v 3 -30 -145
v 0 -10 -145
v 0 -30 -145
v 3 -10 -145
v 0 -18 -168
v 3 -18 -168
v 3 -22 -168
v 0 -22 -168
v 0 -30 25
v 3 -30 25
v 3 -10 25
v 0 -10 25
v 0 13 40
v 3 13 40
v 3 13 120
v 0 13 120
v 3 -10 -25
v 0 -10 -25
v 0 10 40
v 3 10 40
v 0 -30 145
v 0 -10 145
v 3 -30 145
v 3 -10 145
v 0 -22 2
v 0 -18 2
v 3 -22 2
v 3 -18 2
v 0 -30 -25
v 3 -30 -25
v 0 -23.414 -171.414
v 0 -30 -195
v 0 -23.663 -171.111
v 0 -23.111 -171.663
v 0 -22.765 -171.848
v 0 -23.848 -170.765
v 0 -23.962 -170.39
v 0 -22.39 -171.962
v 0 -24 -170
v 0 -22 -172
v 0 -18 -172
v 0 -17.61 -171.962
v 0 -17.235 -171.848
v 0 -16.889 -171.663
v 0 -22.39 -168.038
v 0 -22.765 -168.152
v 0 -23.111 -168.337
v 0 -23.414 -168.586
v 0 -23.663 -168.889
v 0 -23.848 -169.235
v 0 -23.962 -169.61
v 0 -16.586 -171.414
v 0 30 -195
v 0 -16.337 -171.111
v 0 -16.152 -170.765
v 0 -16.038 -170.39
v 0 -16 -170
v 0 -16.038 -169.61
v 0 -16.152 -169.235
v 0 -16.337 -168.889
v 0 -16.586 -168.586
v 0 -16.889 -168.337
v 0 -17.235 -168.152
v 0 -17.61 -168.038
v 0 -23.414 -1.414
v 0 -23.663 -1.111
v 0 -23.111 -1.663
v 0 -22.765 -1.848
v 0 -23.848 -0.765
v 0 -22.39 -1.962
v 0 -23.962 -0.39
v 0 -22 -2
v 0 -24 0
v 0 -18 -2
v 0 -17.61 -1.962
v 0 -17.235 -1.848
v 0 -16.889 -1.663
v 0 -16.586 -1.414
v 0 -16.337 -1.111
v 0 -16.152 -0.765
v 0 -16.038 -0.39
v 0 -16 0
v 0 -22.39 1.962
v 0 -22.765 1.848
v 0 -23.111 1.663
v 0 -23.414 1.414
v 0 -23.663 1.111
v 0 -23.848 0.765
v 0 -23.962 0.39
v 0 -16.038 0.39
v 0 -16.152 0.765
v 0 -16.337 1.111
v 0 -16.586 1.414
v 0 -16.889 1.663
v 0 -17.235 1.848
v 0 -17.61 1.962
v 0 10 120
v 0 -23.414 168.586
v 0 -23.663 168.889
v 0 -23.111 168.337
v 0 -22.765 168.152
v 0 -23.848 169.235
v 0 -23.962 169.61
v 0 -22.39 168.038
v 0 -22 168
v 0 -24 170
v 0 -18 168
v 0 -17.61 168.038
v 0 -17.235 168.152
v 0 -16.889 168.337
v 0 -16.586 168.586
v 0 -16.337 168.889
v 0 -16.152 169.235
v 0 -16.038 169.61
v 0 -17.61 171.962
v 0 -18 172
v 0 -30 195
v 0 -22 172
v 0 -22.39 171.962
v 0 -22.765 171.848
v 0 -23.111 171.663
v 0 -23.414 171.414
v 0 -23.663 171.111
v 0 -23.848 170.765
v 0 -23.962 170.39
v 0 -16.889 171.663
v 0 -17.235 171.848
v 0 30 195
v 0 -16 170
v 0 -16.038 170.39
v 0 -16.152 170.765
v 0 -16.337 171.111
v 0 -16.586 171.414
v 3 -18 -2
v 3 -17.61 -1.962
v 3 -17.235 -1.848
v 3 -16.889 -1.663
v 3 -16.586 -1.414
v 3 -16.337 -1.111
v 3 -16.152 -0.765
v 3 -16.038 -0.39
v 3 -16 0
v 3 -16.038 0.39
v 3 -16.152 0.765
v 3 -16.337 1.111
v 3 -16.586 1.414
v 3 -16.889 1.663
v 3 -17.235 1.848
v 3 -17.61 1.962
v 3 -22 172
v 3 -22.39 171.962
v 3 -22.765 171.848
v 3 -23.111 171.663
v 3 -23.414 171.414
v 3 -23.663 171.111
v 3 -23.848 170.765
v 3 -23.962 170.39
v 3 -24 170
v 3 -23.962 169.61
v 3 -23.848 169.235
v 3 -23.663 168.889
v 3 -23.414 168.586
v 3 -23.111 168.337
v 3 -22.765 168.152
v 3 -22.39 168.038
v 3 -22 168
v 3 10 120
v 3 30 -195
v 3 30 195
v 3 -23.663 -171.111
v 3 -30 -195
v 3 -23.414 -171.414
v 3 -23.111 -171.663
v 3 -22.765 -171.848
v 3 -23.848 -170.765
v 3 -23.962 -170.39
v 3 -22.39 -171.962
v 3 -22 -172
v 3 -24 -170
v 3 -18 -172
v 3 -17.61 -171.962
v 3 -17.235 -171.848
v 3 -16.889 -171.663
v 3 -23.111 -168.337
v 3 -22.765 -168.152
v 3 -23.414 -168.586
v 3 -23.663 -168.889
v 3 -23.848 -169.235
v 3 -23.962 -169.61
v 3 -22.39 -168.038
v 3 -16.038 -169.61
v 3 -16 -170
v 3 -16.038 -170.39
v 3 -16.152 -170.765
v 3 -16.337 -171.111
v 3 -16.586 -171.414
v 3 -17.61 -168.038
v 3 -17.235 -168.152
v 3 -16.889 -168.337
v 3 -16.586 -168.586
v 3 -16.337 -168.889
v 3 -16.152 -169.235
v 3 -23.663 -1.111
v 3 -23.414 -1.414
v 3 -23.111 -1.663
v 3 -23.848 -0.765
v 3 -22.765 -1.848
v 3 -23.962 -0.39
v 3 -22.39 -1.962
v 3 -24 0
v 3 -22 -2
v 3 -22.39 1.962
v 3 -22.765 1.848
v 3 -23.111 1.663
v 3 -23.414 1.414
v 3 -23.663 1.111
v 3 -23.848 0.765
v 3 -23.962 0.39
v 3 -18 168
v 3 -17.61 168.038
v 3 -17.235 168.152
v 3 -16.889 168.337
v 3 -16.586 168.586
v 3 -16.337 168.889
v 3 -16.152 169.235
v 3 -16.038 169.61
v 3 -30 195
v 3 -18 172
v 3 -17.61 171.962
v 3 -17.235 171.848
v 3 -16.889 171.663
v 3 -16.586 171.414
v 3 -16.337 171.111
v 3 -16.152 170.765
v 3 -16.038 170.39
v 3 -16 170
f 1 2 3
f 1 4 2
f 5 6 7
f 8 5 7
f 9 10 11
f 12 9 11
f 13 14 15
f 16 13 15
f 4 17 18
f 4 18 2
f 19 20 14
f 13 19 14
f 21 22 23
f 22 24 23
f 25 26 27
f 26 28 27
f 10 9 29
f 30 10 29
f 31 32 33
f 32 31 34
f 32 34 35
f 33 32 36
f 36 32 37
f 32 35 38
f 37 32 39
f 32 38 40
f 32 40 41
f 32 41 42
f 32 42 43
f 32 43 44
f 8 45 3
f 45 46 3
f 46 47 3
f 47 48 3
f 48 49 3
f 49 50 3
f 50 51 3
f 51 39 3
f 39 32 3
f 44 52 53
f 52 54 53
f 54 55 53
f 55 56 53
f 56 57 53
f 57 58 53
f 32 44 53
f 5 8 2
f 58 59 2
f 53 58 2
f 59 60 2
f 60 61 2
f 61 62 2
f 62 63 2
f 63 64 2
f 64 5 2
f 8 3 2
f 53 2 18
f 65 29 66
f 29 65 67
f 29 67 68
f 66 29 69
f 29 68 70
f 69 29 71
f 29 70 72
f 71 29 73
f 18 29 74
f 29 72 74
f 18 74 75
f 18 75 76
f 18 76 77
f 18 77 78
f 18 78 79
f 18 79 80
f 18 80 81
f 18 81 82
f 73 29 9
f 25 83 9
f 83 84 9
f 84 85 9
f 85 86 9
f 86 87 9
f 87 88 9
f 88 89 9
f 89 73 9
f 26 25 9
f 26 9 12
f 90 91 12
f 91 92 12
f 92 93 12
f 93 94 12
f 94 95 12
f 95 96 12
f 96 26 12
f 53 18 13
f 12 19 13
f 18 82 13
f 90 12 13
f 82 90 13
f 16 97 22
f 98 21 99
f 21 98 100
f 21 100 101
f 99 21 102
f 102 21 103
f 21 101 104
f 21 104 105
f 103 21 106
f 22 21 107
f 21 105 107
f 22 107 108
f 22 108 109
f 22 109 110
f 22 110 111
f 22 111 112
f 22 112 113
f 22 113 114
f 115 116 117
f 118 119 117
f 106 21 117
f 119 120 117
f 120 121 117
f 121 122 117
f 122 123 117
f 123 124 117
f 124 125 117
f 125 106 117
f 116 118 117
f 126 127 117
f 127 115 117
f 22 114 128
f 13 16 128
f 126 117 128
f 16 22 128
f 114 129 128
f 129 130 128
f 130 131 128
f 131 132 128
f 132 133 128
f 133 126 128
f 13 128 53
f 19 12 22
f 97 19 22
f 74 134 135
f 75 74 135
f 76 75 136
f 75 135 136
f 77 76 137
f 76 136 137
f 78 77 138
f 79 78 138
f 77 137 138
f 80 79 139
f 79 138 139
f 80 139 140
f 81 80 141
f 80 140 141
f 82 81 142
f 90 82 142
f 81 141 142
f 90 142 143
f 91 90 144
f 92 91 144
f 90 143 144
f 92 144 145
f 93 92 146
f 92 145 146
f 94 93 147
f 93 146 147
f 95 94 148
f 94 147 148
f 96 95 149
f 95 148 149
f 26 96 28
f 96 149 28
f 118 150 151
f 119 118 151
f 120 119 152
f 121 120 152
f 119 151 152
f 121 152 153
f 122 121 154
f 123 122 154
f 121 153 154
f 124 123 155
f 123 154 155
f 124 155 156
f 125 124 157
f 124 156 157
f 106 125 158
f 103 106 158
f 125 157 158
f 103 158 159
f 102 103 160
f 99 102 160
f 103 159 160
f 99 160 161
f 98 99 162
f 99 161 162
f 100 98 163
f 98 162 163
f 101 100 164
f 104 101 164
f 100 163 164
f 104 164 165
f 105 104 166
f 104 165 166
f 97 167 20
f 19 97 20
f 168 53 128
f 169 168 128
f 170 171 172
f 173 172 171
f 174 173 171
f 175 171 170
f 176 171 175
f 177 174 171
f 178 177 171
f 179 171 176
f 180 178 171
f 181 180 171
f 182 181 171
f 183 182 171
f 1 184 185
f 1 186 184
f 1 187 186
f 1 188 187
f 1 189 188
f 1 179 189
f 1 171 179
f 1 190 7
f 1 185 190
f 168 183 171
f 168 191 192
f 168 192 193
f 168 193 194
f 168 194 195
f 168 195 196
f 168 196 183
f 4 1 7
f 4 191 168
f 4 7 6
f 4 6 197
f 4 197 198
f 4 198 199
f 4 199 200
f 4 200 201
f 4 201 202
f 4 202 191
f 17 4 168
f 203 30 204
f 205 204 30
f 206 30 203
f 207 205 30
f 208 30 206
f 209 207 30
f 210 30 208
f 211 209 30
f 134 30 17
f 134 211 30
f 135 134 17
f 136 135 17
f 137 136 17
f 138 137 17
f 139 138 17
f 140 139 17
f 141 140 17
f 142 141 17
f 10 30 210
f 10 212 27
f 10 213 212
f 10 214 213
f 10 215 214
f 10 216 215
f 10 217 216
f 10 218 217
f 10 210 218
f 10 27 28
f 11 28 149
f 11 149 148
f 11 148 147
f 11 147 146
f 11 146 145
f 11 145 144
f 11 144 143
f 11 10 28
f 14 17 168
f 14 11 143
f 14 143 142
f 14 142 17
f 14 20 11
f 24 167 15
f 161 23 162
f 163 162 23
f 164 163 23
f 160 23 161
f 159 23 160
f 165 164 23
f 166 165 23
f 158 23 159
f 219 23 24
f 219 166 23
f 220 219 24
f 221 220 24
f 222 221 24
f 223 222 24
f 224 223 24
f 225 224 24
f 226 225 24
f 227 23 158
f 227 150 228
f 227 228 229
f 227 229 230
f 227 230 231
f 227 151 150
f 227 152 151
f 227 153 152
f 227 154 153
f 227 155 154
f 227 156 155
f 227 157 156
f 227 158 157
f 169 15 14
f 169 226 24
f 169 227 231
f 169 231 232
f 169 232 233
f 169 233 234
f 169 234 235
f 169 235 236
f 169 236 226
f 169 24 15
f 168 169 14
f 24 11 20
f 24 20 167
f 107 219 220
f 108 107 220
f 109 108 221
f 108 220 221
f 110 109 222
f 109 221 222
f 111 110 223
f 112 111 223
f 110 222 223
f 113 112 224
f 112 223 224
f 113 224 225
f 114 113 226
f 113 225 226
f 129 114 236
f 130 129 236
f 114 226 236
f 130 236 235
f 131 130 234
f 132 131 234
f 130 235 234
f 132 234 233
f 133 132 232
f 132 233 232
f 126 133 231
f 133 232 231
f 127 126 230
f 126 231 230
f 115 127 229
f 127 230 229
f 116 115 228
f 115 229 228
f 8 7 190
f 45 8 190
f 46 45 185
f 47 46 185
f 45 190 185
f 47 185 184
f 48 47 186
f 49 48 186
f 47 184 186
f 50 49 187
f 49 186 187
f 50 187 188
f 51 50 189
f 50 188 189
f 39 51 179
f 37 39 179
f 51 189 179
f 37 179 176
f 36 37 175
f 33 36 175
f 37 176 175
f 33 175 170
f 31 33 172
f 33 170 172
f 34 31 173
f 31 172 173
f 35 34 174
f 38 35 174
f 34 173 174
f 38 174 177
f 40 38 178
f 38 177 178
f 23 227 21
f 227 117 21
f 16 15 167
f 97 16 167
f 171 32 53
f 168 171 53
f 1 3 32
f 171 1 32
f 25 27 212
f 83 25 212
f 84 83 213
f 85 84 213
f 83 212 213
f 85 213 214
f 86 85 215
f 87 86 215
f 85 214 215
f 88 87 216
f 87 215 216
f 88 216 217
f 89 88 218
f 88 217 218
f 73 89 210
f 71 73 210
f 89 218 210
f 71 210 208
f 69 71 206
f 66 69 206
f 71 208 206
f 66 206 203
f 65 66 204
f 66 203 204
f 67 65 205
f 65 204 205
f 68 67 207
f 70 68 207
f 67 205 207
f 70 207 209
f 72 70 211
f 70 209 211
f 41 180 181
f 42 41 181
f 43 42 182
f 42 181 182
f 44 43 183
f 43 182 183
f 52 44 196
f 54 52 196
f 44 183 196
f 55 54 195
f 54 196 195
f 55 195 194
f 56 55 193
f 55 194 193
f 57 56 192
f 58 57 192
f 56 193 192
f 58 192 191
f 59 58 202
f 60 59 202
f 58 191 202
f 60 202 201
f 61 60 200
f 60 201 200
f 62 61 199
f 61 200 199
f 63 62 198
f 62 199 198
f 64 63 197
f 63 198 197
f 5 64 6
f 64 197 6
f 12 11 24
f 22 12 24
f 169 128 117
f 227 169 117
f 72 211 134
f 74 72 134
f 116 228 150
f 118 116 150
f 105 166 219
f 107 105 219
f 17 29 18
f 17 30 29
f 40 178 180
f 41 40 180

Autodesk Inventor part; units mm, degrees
ref_plane "YZ Plane" through (0, 0, 0) normal (1, 0, 0) x (0, 1, 0)
ref_plane "XZ Plane" through (0, 0, 0) normal (0, 1, 0) x (-1, 0, 0)
ref_plane "XY Plane" through (0, 0, 0) normal (0, 0, 1) x (1, 0, 0)
sketch "스케치1" plane through (0, 0, 0) normal (1, 0, 0) x (0, 1, 0)
  line L0 (30, 195) -> (-30, 195)
  line L1 (-30, 195) -> (-30, -195)
  line L2 (-30, -195) -> (30, -195)
  line L3 (30, -195) -> (30, 195)
  point P0 (0, 0)
  dimension "d0" = 60
  dimension "d1" = 390
  dimension "d2" = 30
  dimension "d3" = 195
extrude "돌출1" add sketch "스케치1" along normal blind 3
sketch "스케치2" plane through (3, 0, 0) normal (1, 0, 0) x (0, 0, -1)
  line L0 (-195, -30) -> (195, -30) projected
  line L1 (-145, -30) -> (-25, -30)
  line L2 (-25, -30) -> (-25, -10)
  line L3 (-25, -10) -> (-145, -10)
  line L4 (-145, -10) -> (-145, -30)
  line L5 (-195, 30) -> (-195, -30) projected
  line L6 (0, 0) -> (0, -66.648) construction
  line L7 (25, -10) -> (145, -10)
  line L8 (145, -10) -> (145, -30)
  line L9 (145, -30) -> (25, -30)
  line L10 (25, -30) -> (25, -10)
  line L11 (195, -30) -> (195, 30) projected
  dimension "d6" = 20
  dimension "d7" = 50
  dimension "d8" = 25
  dimension "d9" = 50
  dimension "d10" = 25
  dimension "d11" = 20
extrude "돌출2" cut sketch "스케치2" against normal through all
sketch "스케치3" plane through (3, 0, 0) normal (1, 0, 0) x (0, 0, -1)
  line L0 (-170, 132.4891) -> (-170, -92.5)
  line L1 (0, 133.9107) -> (0, -104.4082)
  line L2 (170, 113.5044) -> (170, -115.928)
  line L3 (195, -30) -> (195, 30) projected
  line L4 (-195, 30) -> (-195, -30) projected
  line L5 (-170, -22) -> (-170, -18) construction
  line L6 (-168, -22) -> (-168, -18)
  line L7 (-172, -18) -> (-172, -22)
  arc A0 (-172, -22) -> (-168, -22) centre (-170, -22) ccw
  arc A1 (-168, -18) -> (-172, -18) centre (-170, -18) ccw
  line L8 (0, -22) -> (0, -18) construction
  line L9 (2, -22) -> (2, -18)
  line L10 (-2, -18) -> (-2, -22)
  arc A2 (-2, -22) -> (2, -22) centre (0, -22) ccw
  arc A3 (2, -18) -> (-2, -18) centre (0, -18) ccw
  line L11 (170, -22) -> (170, -18) construction
  line L12 (172, -22) -> (172, -18)
  line L13 (168, -18) -> (168, -22)
  arc A4 (168, -22) -> (172, -22) centre (170, -22) ccw
  arc A5 (172, -18) -> (168, -18) centre (170, -18) ccw
  line L14 (145, -30) -> (195, -30) projected
  line L15 (-25, -30) -> (25, -30) projected
  line L16 (-195, -30) -> (-145, -30) projected
  line L17 (-120, 10) -> (-40, 10)
  line L18 (-40, 10) -> (-40, 13)
  line L19 (-40, 13) -> (-120, 13)
  line L20 (-120, 13) -> (-120, 10)
  point P0 (0, 0)
  point P1 (-170, -20)
  point P2 (0, -20)
  point P3 (170, -20)
  dimension "d14" = 25
  dimension "d15" = 25
  dimension "d16" = 0
  dimension "d17" = 4
  dimension "d18" = 4
  dimension "d19" = 4
  dimension "d20" = 4
  dimension "d21" = 4
  dimension "d22" = 4
  dimension "d23" = 10
  dimension "d24" = 10
  dimension "d25" = 10
  dimension "d36" = 80
  dimension "d37" = 3
  dimension "d38" = 75
  dimension "d39" = 10
extrude "돌출3" cut sketch "스케치3" against normal blind 10
equation "\"d3\" = 0.5 * d1"
equation "\"d6\" = d11"
equation "\"d10\" = d8"
properties part number "라즈베리파이보관_옆판" material "PMMA 플라스틱"
